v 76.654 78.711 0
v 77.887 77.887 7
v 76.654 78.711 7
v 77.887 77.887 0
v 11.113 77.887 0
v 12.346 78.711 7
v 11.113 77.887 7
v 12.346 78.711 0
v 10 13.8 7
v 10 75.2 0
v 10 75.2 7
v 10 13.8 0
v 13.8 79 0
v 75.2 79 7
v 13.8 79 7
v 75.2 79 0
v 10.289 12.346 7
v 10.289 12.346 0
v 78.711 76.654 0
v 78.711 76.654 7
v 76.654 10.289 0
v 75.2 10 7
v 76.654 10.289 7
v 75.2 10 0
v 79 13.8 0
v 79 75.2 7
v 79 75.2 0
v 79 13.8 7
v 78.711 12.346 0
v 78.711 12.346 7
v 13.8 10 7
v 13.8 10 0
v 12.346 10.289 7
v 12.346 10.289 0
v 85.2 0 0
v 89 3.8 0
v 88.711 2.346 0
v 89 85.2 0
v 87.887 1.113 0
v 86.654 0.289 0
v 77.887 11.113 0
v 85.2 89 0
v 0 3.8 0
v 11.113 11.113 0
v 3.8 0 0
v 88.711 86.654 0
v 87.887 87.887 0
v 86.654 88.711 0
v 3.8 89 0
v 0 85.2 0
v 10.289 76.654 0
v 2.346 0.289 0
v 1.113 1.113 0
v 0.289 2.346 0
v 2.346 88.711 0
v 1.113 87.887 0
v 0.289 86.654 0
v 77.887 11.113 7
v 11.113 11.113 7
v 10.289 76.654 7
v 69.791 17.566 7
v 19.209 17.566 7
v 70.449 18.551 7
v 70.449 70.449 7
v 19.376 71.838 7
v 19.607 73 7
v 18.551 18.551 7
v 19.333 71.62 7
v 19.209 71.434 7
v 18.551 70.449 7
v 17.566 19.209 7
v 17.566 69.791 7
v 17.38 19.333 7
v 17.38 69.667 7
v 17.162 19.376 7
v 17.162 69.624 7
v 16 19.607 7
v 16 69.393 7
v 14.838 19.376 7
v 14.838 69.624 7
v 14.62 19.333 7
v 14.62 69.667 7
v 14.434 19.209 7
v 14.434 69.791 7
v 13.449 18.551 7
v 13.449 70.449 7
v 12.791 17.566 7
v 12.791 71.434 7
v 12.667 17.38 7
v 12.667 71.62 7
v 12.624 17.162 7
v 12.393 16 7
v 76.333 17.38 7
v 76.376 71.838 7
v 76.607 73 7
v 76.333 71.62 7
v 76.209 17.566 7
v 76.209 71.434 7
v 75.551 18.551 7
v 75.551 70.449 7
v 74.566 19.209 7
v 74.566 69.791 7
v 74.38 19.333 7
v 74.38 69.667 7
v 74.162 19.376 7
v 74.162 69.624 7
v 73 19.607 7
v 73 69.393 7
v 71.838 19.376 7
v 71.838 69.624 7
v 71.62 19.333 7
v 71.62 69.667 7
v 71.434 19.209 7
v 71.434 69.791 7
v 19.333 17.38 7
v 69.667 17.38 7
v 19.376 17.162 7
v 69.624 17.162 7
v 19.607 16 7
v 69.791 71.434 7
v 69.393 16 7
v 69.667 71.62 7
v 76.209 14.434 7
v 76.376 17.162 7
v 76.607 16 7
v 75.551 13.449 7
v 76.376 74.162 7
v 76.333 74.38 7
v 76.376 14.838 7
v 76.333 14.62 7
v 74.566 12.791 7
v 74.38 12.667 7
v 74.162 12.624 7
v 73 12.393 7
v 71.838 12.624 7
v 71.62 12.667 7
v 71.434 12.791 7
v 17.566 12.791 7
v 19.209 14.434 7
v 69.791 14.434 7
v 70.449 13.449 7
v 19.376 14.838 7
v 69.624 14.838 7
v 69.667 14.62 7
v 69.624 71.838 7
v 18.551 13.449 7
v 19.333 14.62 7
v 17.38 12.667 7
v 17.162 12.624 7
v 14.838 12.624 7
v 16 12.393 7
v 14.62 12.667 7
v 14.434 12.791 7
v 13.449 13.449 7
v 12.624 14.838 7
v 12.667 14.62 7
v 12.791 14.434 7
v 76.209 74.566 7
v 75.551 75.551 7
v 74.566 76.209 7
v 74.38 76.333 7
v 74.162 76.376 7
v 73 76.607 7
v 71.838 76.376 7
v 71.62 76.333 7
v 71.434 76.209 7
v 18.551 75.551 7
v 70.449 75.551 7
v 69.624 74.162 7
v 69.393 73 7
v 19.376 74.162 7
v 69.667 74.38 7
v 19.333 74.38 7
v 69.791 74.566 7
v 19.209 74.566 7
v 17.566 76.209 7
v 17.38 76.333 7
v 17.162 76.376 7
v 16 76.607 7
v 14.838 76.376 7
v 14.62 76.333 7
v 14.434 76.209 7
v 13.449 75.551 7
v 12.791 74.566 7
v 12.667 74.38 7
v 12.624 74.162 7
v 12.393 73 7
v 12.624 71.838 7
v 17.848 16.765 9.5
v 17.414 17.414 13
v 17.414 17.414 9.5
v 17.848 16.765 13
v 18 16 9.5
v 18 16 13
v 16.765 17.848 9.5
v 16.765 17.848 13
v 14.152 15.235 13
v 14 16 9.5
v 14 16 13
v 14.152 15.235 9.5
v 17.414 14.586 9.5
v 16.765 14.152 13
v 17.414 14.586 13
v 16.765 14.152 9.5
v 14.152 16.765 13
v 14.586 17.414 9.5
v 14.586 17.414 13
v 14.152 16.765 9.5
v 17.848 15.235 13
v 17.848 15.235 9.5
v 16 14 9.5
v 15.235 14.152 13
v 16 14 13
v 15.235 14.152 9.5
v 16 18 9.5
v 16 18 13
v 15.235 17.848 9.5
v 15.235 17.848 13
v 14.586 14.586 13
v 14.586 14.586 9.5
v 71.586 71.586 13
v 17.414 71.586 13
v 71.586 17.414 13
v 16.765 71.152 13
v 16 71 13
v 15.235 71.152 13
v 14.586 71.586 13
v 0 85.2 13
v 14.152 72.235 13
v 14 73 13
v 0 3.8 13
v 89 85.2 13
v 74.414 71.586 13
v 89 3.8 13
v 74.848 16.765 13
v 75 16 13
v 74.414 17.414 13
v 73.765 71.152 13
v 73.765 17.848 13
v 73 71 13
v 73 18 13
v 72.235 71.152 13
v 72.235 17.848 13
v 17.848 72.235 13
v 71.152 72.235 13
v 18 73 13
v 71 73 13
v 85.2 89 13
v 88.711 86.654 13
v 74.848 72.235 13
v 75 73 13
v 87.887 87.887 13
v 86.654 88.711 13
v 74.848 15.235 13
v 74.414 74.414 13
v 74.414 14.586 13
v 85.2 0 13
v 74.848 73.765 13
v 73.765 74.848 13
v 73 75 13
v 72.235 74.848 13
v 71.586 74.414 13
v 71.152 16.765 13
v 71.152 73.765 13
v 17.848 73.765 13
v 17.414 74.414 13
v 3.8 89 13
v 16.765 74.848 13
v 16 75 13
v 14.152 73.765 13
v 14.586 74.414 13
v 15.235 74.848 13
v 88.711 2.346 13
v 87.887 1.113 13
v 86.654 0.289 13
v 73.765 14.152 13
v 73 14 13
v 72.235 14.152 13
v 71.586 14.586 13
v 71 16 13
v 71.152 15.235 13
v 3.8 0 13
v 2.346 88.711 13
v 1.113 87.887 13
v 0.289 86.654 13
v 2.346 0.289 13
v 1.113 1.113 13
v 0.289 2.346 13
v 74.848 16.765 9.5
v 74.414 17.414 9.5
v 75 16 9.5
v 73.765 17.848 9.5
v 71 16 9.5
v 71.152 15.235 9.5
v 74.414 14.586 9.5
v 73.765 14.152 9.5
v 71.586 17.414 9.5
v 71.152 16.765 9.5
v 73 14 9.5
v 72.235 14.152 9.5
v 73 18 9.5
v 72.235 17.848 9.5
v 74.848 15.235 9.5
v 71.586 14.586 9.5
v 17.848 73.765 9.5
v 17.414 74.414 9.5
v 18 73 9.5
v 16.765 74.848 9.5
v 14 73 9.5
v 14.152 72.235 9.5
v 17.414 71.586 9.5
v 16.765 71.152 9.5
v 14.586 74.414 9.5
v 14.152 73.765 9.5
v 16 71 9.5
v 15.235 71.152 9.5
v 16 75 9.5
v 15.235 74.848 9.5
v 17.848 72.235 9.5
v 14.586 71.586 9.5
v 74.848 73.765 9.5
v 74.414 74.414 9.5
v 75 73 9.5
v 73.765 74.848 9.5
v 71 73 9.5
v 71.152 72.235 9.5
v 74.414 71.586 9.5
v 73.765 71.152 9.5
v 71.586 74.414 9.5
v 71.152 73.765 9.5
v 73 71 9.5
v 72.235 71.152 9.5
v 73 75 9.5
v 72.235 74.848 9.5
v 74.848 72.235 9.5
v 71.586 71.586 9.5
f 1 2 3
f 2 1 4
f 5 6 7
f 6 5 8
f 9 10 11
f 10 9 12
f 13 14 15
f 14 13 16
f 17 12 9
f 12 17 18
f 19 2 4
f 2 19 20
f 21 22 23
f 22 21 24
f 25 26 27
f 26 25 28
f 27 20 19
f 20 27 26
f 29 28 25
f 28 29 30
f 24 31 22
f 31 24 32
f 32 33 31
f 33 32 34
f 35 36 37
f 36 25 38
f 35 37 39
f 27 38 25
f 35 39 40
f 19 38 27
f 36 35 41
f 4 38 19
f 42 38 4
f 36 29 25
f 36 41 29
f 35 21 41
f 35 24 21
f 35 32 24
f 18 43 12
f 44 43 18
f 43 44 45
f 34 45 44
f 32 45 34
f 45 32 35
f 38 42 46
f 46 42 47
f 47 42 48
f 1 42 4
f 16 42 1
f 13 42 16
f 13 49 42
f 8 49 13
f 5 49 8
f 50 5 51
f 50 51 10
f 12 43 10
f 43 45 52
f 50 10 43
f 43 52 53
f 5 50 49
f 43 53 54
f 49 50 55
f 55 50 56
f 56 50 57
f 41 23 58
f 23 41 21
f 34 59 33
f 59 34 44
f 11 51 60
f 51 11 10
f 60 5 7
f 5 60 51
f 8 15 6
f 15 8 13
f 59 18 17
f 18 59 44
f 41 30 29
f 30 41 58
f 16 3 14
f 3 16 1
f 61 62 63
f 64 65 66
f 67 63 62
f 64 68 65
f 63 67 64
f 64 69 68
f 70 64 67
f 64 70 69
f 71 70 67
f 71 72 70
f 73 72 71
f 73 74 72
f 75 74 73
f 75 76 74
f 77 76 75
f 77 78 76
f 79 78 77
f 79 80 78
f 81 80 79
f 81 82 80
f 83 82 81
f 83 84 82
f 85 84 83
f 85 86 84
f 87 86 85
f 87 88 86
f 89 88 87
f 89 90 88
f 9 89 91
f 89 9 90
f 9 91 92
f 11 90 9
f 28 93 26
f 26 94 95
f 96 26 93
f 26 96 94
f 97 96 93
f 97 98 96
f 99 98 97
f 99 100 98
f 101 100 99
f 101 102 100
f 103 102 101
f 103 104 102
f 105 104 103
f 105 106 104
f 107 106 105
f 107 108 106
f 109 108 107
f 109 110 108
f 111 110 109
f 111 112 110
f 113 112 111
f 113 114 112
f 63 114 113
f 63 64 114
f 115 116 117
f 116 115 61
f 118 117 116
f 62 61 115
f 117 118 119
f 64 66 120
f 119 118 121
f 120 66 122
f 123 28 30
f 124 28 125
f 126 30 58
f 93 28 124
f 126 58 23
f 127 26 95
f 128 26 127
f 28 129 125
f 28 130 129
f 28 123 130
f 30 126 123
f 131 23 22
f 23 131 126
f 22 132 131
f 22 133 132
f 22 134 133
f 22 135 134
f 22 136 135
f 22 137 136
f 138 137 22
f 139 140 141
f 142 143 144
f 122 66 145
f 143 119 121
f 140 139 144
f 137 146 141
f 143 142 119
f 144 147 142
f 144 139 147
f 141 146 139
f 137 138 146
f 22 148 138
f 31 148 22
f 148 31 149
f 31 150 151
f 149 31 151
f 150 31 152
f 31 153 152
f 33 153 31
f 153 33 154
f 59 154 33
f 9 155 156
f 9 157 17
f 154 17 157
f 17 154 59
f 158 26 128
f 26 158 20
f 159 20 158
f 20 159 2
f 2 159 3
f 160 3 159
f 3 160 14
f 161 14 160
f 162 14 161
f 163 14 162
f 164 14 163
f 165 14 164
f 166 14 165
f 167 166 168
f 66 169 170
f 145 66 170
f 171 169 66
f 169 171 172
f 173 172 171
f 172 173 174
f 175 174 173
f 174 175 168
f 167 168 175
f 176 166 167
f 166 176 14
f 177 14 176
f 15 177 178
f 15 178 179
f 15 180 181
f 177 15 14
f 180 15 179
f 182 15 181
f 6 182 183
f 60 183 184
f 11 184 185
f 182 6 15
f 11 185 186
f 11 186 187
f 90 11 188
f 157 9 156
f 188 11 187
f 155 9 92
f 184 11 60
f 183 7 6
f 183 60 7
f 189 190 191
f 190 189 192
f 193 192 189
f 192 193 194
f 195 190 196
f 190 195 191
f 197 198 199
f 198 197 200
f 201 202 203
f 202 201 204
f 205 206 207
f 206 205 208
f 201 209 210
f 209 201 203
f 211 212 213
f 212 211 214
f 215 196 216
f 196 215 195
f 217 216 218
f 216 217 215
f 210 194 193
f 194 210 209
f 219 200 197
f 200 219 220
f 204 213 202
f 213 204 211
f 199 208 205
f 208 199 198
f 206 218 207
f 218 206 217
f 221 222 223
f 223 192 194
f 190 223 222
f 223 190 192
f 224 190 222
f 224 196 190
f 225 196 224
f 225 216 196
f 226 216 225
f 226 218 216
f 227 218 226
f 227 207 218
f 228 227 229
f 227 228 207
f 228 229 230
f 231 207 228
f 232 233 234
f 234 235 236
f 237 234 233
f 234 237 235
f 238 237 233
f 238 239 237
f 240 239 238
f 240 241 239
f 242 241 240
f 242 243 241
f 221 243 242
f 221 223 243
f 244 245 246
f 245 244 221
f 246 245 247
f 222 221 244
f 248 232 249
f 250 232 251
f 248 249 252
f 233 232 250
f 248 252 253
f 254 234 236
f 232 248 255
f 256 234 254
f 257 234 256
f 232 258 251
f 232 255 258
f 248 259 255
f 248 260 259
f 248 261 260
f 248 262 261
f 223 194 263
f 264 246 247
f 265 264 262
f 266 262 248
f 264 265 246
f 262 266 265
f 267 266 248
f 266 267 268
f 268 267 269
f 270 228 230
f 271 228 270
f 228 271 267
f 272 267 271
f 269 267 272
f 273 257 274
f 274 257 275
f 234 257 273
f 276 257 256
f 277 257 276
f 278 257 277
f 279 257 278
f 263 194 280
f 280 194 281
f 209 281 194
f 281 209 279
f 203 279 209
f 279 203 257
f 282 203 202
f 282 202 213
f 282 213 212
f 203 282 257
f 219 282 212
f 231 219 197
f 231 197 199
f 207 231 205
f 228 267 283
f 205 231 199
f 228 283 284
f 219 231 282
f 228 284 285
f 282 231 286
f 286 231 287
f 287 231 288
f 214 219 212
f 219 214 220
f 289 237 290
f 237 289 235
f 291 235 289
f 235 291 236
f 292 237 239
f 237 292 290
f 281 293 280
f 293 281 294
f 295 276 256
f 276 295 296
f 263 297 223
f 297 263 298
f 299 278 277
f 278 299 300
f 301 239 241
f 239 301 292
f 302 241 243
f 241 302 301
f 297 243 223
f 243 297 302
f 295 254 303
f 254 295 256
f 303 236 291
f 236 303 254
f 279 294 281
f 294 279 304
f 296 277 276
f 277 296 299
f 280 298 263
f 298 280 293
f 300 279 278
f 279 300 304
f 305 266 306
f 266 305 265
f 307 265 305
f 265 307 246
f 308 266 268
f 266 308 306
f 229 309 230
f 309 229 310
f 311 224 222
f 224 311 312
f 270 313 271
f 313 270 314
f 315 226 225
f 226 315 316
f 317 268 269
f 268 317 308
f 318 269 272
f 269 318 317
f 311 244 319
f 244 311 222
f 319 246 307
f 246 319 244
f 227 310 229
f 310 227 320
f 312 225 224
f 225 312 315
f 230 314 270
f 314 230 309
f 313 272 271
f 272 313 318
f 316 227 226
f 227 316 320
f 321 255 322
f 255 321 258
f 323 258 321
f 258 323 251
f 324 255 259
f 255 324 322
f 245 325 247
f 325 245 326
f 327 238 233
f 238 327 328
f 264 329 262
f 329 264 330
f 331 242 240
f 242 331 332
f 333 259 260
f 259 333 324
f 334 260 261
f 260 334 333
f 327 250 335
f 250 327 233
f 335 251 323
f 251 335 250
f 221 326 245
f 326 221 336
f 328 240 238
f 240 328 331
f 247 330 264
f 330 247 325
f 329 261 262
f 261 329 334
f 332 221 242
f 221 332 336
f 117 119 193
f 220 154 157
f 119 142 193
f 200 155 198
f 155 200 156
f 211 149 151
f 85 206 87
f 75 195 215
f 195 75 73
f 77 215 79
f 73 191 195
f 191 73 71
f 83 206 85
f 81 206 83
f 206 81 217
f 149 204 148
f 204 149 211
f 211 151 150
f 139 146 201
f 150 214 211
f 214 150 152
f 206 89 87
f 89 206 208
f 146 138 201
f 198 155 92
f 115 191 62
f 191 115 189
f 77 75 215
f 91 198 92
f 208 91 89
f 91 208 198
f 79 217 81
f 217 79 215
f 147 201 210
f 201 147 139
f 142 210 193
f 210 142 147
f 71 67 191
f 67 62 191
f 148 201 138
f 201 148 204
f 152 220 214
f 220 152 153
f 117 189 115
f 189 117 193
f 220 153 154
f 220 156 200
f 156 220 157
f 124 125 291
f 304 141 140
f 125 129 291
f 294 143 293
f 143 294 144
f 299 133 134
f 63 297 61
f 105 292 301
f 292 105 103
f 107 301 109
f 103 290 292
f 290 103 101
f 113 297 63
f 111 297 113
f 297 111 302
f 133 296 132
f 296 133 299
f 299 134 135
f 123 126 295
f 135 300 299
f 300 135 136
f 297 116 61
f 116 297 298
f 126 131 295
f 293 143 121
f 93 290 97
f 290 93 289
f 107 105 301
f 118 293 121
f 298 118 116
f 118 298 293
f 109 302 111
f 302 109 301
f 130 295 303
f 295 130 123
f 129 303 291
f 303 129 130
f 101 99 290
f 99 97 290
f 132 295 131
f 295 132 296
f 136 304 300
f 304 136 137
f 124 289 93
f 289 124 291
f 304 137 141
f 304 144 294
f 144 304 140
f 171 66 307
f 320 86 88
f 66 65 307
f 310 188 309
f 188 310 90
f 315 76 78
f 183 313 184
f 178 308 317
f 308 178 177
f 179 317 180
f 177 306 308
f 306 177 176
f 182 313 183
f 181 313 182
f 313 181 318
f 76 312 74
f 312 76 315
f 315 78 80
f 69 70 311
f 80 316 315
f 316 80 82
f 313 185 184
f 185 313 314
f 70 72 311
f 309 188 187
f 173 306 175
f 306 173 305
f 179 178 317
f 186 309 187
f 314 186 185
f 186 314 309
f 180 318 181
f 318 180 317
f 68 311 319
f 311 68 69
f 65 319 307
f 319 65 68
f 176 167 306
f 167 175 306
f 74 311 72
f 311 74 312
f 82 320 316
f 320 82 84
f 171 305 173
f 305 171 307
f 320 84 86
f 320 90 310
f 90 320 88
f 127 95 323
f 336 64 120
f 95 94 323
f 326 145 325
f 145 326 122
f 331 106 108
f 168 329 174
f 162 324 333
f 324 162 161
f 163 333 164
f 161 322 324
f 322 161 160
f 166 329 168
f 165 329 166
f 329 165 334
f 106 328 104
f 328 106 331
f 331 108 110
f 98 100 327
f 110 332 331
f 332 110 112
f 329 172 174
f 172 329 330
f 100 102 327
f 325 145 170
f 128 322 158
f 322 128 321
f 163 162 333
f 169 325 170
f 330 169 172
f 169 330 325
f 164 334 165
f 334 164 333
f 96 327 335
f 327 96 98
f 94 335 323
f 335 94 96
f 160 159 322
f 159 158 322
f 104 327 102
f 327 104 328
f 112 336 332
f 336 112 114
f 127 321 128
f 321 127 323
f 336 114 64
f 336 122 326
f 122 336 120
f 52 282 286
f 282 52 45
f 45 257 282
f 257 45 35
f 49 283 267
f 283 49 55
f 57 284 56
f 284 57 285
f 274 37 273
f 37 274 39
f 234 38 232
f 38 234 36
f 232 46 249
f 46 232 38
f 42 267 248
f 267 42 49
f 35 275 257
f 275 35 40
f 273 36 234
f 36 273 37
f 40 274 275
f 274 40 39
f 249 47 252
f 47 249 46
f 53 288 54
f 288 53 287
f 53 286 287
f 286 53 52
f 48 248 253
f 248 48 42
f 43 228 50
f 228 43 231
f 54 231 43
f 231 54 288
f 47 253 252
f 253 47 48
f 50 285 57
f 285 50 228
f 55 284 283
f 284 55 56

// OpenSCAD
$fn=16;


corner_radius = 7.6/2;

difference() {
  union() {
    minkowski() {
      translate([corner_radius, corner_radius, 0])
        cube([89-corner_radius*2, 89-corner_radius*2, 12]);
      cylinder(h=1, r=corner_radius);
    }
  }
  union() {
    minkowski() {
      translate([10+corner_radius, 10+corner_radius, 0])
        cube([69-corner_radius*2, 69-corner_radius*2, 6]);
      cylinder(h=1, r=corner_radius);
    }
    // Screw holes.
    translate([16, 16, 6]) cylinder(h=7, d=4);
    translate([89-16, 16, 6]) cylinder(h=7, d=4);
    translate([16, 89-16, 6]) cylinder(h=7, d=4);
    translate([89-16, 89-16, 6]) cylinder(h=7, d=4);
    // Countersink.
    translate([16, 16, 6]) cylinder(h=3.5, d1=8.5, d2=4);
    translate([89-16, 16, 6]) cylinder(h=3.5, d1=8.5, d2=4);
    translate([16, 89-16, 6]) cylinder(h=3.5, d1=8.5, d2=4);
    translate([89-16, 89-16, 6]) cylinder(h=3.5, d1=8.5, d2=4);    
  }
}
